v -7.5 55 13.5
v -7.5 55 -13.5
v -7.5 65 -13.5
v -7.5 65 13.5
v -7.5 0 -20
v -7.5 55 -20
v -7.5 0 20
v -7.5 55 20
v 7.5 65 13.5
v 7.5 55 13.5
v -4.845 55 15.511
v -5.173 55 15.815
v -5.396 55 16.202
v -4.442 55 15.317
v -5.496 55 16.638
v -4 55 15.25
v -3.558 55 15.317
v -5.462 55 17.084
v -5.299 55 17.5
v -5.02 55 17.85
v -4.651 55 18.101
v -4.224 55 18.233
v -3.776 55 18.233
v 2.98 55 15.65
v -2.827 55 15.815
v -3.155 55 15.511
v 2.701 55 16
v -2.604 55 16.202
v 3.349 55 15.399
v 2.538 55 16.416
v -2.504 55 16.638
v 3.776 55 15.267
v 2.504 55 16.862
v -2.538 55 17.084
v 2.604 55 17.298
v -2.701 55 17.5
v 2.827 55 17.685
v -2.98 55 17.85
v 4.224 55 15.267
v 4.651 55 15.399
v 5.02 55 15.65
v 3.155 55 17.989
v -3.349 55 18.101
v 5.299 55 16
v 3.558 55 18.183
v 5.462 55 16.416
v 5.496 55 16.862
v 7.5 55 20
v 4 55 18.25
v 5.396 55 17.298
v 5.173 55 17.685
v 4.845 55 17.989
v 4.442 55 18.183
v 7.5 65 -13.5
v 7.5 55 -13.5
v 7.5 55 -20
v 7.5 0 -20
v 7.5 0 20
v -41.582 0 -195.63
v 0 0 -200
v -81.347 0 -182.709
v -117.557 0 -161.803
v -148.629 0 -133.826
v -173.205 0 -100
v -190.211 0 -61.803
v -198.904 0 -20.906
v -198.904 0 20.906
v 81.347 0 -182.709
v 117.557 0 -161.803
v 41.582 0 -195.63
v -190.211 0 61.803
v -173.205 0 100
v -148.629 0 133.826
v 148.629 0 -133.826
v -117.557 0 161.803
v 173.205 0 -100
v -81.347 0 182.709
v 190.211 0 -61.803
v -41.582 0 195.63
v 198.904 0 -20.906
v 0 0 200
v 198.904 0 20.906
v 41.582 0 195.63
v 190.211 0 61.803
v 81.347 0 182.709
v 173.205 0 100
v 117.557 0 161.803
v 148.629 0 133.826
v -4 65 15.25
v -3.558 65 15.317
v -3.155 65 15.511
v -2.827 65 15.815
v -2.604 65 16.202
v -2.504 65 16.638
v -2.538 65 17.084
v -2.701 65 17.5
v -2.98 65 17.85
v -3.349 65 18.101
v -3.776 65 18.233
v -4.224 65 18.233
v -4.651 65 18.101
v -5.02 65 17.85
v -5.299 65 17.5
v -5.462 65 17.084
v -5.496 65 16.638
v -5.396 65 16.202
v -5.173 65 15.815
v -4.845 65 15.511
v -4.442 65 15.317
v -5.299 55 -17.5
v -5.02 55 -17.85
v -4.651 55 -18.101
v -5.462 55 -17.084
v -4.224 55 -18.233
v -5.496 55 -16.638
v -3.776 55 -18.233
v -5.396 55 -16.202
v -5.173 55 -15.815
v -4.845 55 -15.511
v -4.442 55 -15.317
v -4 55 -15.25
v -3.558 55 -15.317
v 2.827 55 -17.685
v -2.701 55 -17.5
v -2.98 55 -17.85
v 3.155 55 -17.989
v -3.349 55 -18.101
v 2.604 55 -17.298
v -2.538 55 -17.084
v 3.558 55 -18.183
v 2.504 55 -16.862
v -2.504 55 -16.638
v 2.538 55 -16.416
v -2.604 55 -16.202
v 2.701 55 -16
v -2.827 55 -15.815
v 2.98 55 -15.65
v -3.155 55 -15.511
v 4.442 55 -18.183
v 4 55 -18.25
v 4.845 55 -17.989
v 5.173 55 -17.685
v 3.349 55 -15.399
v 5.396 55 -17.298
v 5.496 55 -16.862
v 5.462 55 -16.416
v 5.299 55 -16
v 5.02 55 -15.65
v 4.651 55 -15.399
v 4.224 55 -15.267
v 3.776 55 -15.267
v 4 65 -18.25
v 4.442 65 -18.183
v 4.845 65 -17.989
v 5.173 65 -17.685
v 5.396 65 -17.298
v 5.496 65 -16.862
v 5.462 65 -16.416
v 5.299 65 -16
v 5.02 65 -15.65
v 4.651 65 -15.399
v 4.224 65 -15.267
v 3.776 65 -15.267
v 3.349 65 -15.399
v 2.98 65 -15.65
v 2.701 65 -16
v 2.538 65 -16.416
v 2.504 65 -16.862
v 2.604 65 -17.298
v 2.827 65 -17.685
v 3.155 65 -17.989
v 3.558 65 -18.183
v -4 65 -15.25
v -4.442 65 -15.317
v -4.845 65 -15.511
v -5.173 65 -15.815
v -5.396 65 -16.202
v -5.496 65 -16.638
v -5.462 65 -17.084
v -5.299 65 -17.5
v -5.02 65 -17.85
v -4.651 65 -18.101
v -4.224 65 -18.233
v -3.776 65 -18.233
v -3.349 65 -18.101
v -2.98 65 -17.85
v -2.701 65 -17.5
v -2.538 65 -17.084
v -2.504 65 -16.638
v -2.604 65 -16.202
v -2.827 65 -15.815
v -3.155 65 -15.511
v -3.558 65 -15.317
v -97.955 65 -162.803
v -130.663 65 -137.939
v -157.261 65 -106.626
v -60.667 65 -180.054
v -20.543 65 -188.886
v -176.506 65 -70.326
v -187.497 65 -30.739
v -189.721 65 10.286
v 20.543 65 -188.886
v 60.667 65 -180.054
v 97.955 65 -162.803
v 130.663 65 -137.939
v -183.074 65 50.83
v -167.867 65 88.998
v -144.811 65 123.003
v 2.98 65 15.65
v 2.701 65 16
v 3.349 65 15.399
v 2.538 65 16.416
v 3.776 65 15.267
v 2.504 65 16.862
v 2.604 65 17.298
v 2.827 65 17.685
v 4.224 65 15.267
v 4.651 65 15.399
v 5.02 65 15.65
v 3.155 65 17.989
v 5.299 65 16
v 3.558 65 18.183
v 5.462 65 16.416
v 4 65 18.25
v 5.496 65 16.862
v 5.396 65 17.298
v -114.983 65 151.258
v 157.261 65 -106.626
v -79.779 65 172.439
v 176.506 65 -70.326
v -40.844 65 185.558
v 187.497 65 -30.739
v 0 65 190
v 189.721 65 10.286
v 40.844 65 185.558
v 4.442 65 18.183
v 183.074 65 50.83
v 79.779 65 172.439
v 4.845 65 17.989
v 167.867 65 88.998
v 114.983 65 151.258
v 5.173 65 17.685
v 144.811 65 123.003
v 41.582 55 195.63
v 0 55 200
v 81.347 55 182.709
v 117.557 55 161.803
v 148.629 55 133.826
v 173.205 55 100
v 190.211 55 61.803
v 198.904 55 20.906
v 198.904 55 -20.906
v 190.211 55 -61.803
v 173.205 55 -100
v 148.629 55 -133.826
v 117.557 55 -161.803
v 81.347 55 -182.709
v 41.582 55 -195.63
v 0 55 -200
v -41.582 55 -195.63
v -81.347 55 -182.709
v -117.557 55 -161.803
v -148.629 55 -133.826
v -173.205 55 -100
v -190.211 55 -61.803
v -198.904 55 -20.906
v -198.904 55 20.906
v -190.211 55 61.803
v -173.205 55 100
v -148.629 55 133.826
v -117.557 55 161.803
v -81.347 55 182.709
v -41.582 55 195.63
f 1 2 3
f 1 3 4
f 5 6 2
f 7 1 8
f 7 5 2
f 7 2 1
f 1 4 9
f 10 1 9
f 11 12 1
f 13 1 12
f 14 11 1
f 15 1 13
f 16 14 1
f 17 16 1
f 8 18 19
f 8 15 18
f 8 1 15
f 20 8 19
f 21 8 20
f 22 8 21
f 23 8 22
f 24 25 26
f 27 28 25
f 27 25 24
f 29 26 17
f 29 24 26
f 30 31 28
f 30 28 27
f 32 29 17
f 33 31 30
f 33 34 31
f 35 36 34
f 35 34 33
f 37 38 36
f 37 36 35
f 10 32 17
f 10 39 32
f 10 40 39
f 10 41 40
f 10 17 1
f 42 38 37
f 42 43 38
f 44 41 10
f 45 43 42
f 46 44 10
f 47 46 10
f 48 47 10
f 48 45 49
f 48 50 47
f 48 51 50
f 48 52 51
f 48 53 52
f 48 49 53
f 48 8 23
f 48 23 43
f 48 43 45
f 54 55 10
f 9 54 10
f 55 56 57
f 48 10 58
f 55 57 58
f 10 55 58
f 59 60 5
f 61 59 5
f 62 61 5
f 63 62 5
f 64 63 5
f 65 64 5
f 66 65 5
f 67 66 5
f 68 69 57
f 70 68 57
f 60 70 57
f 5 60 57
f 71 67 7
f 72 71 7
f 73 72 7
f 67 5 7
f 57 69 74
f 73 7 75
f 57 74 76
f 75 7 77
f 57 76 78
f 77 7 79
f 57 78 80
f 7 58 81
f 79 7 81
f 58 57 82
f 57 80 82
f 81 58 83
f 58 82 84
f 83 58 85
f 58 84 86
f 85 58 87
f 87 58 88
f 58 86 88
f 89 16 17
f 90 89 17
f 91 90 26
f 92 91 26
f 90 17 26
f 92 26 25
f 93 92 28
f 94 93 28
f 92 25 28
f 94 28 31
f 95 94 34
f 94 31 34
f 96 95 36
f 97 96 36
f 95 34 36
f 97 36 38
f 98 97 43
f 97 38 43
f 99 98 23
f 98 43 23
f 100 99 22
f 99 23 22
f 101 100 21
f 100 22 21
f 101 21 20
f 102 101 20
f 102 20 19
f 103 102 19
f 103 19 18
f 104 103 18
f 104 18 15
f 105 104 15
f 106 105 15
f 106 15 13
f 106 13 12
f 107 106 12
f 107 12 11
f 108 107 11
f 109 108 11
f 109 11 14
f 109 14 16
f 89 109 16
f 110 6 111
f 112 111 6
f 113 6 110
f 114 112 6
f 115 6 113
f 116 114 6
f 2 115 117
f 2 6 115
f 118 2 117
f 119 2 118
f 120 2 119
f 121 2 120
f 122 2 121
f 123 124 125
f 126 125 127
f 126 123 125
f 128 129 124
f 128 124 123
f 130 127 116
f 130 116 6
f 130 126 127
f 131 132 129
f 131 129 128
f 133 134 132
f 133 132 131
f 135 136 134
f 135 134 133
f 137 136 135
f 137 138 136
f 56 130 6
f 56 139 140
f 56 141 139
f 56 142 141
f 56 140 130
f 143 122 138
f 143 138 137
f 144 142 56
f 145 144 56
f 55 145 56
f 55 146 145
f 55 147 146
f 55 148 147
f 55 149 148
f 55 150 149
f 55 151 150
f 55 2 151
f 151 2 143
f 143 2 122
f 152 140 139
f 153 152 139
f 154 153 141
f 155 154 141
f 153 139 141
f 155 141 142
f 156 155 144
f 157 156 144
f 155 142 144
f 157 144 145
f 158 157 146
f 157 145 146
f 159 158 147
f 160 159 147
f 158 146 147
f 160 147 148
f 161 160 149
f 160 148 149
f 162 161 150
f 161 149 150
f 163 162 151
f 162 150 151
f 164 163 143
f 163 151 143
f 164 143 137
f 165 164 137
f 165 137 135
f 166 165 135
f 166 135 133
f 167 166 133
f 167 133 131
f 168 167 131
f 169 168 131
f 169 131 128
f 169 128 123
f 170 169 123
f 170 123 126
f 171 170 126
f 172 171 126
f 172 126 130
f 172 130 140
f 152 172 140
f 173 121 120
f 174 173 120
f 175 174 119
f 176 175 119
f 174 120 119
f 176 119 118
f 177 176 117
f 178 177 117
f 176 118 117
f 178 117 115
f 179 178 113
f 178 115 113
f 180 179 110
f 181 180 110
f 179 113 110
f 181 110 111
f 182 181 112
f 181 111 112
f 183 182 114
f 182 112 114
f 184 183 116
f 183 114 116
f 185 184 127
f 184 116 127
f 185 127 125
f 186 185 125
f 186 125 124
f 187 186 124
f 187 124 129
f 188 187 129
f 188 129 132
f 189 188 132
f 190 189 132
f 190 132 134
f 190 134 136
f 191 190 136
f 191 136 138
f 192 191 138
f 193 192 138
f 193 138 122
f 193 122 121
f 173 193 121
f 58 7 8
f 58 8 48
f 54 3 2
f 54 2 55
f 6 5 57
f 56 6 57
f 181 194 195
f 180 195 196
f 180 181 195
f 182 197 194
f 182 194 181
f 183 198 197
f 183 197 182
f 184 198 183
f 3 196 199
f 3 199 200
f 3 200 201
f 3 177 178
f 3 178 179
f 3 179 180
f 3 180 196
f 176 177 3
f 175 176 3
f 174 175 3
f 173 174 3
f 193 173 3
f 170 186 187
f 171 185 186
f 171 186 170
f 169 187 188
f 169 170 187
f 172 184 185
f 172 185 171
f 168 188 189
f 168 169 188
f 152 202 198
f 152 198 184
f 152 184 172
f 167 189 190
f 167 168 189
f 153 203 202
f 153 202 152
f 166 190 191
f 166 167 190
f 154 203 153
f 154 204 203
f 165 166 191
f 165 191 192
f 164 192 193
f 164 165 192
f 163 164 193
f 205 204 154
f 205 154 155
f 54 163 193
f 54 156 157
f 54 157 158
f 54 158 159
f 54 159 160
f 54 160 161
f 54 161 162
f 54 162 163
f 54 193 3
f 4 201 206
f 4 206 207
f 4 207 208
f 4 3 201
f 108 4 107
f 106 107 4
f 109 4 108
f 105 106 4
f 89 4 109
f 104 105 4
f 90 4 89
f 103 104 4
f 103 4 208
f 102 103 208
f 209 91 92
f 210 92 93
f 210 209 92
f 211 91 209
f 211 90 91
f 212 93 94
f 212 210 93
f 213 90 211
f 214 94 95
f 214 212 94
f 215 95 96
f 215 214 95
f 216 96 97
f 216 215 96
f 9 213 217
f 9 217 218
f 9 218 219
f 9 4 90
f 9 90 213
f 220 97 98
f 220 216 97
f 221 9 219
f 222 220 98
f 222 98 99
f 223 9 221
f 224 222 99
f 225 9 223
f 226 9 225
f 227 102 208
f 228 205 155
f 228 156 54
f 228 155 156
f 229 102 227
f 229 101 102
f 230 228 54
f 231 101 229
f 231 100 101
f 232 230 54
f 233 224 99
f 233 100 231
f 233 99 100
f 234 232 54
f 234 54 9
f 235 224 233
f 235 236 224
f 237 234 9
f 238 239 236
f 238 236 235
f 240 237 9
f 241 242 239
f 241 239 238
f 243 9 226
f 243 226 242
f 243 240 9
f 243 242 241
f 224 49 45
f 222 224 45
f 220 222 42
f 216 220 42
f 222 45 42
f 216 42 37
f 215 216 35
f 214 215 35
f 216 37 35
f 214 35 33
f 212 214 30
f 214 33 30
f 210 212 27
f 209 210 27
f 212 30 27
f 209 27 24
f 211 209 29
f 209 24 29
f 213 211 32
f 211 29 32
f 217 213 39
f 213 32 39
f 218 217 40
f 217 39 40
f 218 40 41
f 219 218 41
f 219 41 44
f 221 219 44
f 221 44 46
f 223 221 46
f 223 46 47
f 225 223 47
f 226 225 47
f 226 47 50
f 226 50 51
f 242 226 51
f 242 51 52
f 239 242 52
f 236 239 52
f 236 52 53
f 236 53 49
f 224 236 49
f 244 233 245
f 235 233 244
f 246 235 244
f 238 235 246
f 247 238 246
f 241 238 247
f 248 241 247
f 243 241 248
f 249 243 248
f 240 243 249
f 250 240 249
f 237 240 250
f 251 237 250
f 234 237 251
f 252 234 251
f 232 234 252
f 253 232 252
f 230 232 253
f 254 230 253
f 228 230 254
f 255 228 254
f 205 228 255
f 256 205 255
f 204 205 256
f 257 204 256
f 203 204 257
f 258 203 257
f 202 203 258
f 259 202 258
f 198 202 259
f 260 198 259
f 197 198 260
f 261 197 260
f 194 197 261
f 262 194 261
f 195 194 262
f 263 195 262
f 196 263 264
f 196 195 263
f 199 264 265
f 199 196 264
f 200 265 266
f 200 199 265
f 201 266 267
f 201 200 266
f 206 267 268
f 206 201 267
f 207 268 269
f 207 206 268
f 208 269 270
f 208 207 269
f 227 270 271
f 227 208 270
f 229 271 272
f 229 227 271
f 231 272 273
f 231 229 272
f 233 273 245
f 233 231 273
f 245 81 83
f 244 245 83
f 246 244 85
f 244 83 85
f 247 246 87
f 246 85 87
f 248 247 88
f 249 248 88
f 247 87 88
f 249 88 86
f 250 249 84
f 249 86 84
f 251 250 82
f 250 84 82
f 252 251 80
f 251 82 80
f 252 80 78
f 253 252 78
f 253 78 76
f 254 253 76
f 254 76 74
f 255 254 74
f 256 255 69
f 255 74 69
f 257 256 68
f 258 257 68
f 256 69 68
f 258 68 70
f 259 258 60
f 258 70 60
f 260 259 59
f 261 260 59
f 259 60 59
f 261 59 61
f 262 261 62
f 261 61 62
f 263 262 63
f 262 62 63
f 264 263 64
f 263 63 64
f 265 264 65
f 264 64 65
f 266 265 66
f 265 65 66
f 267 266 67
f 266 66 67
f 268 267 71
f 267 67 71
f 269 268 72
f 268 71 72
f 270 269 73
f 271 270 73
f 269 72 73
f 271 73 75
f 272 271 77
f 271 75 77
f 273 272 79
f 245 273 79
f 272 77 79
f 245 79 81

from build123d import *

# Parameters (mm, degrees)
SKETCH1_R           = 200
BOSS_EXTRUDE1_DEPTH = 65
SKETCH2_W           = 15
SKETCH2_H           = 27
CUT_EXTRUDE1_DEPTH  = 291.215437219
SKETCH3_W           = 15
SKETCH3_H           = 40
CUT_EXTRUDE2_DEPTH  = 55
CHAMFER1_SIZE       = 10
SKETCH4_R           = 1.5
CUT_EXTRUDE3_DEPTH  = 289.140590684


with BuildPart() as part:
    # Sketch1 → Boss-Extrude1 (new body)
    with BuildSketch(Plane(origin=(0, 0, 0), x_dir=(1, 0, 0), z_dir=(0, 1, 0))):
        with Locations(Location((0, 0, 0), (0, 0, 270))):
            Circle(SKETCH1_R)
    extrude(amount=BOSS_EXTRUDE1_DEPTH)

    # Sketch2 → Cut-Extrude1 (cut, through all)
    with BuildSketch(Plane(origin=(0, 65, 0), x_dir=(1, 0, 0), z_dir=(0, 1, 0))):
        Rectangle(SKETCH2_W, SKETCH2_H)
    extrude(amount=-CUT_EXTRUDE1_DEPTH, mode=Mode.SUBTRACT)

    # Sketch3 → Cut-Extrude2 (cut)
    with BuildSketch(Plane.XZ):
        Rectangle(SKETCH3_W, SKETCH3_H)
    extrude(amount=-CUT_EXTRUDE2_DEPTH, mode=Mode.SUBTRACT)

    # Chamfer1
    chamfer1_edges = [part.edges().sort_by_distance(p)[0] for p in [
        (0, 65, -200),
    ]]
    chamfer(chamfer1_edges, length=CHAMFER1_SIZE)

    # Sketch4 → Cut-Extrude3 (cut, through all)
    with BuildSketch(Plane(origin=(0, 55, 0), x_dir=(-1, 0, 0), z_dir=(0, -1, 0))):
        with Locations(Location((4, -16.75, 0), (0, 0, 90))):
            Circle(SKETCH4_R)
        with Locations(Location((-4, -16.75, 0), (0, 0, 270))):
            Circle(SKETCH4_R)
        with Locations(Location((4, 16.75, 0), (0, 0, 270))):
            Circle(SKETCH4_R)
        with Locations(Location((-4, 16.75, 0), (0, 0, 90))):
            Circle(SKETCH4_R)
    extrude(amount=-CUT_EXTRUDE3_DEPTH, mode=Mode.SUBTRACT)


solid = part.part
